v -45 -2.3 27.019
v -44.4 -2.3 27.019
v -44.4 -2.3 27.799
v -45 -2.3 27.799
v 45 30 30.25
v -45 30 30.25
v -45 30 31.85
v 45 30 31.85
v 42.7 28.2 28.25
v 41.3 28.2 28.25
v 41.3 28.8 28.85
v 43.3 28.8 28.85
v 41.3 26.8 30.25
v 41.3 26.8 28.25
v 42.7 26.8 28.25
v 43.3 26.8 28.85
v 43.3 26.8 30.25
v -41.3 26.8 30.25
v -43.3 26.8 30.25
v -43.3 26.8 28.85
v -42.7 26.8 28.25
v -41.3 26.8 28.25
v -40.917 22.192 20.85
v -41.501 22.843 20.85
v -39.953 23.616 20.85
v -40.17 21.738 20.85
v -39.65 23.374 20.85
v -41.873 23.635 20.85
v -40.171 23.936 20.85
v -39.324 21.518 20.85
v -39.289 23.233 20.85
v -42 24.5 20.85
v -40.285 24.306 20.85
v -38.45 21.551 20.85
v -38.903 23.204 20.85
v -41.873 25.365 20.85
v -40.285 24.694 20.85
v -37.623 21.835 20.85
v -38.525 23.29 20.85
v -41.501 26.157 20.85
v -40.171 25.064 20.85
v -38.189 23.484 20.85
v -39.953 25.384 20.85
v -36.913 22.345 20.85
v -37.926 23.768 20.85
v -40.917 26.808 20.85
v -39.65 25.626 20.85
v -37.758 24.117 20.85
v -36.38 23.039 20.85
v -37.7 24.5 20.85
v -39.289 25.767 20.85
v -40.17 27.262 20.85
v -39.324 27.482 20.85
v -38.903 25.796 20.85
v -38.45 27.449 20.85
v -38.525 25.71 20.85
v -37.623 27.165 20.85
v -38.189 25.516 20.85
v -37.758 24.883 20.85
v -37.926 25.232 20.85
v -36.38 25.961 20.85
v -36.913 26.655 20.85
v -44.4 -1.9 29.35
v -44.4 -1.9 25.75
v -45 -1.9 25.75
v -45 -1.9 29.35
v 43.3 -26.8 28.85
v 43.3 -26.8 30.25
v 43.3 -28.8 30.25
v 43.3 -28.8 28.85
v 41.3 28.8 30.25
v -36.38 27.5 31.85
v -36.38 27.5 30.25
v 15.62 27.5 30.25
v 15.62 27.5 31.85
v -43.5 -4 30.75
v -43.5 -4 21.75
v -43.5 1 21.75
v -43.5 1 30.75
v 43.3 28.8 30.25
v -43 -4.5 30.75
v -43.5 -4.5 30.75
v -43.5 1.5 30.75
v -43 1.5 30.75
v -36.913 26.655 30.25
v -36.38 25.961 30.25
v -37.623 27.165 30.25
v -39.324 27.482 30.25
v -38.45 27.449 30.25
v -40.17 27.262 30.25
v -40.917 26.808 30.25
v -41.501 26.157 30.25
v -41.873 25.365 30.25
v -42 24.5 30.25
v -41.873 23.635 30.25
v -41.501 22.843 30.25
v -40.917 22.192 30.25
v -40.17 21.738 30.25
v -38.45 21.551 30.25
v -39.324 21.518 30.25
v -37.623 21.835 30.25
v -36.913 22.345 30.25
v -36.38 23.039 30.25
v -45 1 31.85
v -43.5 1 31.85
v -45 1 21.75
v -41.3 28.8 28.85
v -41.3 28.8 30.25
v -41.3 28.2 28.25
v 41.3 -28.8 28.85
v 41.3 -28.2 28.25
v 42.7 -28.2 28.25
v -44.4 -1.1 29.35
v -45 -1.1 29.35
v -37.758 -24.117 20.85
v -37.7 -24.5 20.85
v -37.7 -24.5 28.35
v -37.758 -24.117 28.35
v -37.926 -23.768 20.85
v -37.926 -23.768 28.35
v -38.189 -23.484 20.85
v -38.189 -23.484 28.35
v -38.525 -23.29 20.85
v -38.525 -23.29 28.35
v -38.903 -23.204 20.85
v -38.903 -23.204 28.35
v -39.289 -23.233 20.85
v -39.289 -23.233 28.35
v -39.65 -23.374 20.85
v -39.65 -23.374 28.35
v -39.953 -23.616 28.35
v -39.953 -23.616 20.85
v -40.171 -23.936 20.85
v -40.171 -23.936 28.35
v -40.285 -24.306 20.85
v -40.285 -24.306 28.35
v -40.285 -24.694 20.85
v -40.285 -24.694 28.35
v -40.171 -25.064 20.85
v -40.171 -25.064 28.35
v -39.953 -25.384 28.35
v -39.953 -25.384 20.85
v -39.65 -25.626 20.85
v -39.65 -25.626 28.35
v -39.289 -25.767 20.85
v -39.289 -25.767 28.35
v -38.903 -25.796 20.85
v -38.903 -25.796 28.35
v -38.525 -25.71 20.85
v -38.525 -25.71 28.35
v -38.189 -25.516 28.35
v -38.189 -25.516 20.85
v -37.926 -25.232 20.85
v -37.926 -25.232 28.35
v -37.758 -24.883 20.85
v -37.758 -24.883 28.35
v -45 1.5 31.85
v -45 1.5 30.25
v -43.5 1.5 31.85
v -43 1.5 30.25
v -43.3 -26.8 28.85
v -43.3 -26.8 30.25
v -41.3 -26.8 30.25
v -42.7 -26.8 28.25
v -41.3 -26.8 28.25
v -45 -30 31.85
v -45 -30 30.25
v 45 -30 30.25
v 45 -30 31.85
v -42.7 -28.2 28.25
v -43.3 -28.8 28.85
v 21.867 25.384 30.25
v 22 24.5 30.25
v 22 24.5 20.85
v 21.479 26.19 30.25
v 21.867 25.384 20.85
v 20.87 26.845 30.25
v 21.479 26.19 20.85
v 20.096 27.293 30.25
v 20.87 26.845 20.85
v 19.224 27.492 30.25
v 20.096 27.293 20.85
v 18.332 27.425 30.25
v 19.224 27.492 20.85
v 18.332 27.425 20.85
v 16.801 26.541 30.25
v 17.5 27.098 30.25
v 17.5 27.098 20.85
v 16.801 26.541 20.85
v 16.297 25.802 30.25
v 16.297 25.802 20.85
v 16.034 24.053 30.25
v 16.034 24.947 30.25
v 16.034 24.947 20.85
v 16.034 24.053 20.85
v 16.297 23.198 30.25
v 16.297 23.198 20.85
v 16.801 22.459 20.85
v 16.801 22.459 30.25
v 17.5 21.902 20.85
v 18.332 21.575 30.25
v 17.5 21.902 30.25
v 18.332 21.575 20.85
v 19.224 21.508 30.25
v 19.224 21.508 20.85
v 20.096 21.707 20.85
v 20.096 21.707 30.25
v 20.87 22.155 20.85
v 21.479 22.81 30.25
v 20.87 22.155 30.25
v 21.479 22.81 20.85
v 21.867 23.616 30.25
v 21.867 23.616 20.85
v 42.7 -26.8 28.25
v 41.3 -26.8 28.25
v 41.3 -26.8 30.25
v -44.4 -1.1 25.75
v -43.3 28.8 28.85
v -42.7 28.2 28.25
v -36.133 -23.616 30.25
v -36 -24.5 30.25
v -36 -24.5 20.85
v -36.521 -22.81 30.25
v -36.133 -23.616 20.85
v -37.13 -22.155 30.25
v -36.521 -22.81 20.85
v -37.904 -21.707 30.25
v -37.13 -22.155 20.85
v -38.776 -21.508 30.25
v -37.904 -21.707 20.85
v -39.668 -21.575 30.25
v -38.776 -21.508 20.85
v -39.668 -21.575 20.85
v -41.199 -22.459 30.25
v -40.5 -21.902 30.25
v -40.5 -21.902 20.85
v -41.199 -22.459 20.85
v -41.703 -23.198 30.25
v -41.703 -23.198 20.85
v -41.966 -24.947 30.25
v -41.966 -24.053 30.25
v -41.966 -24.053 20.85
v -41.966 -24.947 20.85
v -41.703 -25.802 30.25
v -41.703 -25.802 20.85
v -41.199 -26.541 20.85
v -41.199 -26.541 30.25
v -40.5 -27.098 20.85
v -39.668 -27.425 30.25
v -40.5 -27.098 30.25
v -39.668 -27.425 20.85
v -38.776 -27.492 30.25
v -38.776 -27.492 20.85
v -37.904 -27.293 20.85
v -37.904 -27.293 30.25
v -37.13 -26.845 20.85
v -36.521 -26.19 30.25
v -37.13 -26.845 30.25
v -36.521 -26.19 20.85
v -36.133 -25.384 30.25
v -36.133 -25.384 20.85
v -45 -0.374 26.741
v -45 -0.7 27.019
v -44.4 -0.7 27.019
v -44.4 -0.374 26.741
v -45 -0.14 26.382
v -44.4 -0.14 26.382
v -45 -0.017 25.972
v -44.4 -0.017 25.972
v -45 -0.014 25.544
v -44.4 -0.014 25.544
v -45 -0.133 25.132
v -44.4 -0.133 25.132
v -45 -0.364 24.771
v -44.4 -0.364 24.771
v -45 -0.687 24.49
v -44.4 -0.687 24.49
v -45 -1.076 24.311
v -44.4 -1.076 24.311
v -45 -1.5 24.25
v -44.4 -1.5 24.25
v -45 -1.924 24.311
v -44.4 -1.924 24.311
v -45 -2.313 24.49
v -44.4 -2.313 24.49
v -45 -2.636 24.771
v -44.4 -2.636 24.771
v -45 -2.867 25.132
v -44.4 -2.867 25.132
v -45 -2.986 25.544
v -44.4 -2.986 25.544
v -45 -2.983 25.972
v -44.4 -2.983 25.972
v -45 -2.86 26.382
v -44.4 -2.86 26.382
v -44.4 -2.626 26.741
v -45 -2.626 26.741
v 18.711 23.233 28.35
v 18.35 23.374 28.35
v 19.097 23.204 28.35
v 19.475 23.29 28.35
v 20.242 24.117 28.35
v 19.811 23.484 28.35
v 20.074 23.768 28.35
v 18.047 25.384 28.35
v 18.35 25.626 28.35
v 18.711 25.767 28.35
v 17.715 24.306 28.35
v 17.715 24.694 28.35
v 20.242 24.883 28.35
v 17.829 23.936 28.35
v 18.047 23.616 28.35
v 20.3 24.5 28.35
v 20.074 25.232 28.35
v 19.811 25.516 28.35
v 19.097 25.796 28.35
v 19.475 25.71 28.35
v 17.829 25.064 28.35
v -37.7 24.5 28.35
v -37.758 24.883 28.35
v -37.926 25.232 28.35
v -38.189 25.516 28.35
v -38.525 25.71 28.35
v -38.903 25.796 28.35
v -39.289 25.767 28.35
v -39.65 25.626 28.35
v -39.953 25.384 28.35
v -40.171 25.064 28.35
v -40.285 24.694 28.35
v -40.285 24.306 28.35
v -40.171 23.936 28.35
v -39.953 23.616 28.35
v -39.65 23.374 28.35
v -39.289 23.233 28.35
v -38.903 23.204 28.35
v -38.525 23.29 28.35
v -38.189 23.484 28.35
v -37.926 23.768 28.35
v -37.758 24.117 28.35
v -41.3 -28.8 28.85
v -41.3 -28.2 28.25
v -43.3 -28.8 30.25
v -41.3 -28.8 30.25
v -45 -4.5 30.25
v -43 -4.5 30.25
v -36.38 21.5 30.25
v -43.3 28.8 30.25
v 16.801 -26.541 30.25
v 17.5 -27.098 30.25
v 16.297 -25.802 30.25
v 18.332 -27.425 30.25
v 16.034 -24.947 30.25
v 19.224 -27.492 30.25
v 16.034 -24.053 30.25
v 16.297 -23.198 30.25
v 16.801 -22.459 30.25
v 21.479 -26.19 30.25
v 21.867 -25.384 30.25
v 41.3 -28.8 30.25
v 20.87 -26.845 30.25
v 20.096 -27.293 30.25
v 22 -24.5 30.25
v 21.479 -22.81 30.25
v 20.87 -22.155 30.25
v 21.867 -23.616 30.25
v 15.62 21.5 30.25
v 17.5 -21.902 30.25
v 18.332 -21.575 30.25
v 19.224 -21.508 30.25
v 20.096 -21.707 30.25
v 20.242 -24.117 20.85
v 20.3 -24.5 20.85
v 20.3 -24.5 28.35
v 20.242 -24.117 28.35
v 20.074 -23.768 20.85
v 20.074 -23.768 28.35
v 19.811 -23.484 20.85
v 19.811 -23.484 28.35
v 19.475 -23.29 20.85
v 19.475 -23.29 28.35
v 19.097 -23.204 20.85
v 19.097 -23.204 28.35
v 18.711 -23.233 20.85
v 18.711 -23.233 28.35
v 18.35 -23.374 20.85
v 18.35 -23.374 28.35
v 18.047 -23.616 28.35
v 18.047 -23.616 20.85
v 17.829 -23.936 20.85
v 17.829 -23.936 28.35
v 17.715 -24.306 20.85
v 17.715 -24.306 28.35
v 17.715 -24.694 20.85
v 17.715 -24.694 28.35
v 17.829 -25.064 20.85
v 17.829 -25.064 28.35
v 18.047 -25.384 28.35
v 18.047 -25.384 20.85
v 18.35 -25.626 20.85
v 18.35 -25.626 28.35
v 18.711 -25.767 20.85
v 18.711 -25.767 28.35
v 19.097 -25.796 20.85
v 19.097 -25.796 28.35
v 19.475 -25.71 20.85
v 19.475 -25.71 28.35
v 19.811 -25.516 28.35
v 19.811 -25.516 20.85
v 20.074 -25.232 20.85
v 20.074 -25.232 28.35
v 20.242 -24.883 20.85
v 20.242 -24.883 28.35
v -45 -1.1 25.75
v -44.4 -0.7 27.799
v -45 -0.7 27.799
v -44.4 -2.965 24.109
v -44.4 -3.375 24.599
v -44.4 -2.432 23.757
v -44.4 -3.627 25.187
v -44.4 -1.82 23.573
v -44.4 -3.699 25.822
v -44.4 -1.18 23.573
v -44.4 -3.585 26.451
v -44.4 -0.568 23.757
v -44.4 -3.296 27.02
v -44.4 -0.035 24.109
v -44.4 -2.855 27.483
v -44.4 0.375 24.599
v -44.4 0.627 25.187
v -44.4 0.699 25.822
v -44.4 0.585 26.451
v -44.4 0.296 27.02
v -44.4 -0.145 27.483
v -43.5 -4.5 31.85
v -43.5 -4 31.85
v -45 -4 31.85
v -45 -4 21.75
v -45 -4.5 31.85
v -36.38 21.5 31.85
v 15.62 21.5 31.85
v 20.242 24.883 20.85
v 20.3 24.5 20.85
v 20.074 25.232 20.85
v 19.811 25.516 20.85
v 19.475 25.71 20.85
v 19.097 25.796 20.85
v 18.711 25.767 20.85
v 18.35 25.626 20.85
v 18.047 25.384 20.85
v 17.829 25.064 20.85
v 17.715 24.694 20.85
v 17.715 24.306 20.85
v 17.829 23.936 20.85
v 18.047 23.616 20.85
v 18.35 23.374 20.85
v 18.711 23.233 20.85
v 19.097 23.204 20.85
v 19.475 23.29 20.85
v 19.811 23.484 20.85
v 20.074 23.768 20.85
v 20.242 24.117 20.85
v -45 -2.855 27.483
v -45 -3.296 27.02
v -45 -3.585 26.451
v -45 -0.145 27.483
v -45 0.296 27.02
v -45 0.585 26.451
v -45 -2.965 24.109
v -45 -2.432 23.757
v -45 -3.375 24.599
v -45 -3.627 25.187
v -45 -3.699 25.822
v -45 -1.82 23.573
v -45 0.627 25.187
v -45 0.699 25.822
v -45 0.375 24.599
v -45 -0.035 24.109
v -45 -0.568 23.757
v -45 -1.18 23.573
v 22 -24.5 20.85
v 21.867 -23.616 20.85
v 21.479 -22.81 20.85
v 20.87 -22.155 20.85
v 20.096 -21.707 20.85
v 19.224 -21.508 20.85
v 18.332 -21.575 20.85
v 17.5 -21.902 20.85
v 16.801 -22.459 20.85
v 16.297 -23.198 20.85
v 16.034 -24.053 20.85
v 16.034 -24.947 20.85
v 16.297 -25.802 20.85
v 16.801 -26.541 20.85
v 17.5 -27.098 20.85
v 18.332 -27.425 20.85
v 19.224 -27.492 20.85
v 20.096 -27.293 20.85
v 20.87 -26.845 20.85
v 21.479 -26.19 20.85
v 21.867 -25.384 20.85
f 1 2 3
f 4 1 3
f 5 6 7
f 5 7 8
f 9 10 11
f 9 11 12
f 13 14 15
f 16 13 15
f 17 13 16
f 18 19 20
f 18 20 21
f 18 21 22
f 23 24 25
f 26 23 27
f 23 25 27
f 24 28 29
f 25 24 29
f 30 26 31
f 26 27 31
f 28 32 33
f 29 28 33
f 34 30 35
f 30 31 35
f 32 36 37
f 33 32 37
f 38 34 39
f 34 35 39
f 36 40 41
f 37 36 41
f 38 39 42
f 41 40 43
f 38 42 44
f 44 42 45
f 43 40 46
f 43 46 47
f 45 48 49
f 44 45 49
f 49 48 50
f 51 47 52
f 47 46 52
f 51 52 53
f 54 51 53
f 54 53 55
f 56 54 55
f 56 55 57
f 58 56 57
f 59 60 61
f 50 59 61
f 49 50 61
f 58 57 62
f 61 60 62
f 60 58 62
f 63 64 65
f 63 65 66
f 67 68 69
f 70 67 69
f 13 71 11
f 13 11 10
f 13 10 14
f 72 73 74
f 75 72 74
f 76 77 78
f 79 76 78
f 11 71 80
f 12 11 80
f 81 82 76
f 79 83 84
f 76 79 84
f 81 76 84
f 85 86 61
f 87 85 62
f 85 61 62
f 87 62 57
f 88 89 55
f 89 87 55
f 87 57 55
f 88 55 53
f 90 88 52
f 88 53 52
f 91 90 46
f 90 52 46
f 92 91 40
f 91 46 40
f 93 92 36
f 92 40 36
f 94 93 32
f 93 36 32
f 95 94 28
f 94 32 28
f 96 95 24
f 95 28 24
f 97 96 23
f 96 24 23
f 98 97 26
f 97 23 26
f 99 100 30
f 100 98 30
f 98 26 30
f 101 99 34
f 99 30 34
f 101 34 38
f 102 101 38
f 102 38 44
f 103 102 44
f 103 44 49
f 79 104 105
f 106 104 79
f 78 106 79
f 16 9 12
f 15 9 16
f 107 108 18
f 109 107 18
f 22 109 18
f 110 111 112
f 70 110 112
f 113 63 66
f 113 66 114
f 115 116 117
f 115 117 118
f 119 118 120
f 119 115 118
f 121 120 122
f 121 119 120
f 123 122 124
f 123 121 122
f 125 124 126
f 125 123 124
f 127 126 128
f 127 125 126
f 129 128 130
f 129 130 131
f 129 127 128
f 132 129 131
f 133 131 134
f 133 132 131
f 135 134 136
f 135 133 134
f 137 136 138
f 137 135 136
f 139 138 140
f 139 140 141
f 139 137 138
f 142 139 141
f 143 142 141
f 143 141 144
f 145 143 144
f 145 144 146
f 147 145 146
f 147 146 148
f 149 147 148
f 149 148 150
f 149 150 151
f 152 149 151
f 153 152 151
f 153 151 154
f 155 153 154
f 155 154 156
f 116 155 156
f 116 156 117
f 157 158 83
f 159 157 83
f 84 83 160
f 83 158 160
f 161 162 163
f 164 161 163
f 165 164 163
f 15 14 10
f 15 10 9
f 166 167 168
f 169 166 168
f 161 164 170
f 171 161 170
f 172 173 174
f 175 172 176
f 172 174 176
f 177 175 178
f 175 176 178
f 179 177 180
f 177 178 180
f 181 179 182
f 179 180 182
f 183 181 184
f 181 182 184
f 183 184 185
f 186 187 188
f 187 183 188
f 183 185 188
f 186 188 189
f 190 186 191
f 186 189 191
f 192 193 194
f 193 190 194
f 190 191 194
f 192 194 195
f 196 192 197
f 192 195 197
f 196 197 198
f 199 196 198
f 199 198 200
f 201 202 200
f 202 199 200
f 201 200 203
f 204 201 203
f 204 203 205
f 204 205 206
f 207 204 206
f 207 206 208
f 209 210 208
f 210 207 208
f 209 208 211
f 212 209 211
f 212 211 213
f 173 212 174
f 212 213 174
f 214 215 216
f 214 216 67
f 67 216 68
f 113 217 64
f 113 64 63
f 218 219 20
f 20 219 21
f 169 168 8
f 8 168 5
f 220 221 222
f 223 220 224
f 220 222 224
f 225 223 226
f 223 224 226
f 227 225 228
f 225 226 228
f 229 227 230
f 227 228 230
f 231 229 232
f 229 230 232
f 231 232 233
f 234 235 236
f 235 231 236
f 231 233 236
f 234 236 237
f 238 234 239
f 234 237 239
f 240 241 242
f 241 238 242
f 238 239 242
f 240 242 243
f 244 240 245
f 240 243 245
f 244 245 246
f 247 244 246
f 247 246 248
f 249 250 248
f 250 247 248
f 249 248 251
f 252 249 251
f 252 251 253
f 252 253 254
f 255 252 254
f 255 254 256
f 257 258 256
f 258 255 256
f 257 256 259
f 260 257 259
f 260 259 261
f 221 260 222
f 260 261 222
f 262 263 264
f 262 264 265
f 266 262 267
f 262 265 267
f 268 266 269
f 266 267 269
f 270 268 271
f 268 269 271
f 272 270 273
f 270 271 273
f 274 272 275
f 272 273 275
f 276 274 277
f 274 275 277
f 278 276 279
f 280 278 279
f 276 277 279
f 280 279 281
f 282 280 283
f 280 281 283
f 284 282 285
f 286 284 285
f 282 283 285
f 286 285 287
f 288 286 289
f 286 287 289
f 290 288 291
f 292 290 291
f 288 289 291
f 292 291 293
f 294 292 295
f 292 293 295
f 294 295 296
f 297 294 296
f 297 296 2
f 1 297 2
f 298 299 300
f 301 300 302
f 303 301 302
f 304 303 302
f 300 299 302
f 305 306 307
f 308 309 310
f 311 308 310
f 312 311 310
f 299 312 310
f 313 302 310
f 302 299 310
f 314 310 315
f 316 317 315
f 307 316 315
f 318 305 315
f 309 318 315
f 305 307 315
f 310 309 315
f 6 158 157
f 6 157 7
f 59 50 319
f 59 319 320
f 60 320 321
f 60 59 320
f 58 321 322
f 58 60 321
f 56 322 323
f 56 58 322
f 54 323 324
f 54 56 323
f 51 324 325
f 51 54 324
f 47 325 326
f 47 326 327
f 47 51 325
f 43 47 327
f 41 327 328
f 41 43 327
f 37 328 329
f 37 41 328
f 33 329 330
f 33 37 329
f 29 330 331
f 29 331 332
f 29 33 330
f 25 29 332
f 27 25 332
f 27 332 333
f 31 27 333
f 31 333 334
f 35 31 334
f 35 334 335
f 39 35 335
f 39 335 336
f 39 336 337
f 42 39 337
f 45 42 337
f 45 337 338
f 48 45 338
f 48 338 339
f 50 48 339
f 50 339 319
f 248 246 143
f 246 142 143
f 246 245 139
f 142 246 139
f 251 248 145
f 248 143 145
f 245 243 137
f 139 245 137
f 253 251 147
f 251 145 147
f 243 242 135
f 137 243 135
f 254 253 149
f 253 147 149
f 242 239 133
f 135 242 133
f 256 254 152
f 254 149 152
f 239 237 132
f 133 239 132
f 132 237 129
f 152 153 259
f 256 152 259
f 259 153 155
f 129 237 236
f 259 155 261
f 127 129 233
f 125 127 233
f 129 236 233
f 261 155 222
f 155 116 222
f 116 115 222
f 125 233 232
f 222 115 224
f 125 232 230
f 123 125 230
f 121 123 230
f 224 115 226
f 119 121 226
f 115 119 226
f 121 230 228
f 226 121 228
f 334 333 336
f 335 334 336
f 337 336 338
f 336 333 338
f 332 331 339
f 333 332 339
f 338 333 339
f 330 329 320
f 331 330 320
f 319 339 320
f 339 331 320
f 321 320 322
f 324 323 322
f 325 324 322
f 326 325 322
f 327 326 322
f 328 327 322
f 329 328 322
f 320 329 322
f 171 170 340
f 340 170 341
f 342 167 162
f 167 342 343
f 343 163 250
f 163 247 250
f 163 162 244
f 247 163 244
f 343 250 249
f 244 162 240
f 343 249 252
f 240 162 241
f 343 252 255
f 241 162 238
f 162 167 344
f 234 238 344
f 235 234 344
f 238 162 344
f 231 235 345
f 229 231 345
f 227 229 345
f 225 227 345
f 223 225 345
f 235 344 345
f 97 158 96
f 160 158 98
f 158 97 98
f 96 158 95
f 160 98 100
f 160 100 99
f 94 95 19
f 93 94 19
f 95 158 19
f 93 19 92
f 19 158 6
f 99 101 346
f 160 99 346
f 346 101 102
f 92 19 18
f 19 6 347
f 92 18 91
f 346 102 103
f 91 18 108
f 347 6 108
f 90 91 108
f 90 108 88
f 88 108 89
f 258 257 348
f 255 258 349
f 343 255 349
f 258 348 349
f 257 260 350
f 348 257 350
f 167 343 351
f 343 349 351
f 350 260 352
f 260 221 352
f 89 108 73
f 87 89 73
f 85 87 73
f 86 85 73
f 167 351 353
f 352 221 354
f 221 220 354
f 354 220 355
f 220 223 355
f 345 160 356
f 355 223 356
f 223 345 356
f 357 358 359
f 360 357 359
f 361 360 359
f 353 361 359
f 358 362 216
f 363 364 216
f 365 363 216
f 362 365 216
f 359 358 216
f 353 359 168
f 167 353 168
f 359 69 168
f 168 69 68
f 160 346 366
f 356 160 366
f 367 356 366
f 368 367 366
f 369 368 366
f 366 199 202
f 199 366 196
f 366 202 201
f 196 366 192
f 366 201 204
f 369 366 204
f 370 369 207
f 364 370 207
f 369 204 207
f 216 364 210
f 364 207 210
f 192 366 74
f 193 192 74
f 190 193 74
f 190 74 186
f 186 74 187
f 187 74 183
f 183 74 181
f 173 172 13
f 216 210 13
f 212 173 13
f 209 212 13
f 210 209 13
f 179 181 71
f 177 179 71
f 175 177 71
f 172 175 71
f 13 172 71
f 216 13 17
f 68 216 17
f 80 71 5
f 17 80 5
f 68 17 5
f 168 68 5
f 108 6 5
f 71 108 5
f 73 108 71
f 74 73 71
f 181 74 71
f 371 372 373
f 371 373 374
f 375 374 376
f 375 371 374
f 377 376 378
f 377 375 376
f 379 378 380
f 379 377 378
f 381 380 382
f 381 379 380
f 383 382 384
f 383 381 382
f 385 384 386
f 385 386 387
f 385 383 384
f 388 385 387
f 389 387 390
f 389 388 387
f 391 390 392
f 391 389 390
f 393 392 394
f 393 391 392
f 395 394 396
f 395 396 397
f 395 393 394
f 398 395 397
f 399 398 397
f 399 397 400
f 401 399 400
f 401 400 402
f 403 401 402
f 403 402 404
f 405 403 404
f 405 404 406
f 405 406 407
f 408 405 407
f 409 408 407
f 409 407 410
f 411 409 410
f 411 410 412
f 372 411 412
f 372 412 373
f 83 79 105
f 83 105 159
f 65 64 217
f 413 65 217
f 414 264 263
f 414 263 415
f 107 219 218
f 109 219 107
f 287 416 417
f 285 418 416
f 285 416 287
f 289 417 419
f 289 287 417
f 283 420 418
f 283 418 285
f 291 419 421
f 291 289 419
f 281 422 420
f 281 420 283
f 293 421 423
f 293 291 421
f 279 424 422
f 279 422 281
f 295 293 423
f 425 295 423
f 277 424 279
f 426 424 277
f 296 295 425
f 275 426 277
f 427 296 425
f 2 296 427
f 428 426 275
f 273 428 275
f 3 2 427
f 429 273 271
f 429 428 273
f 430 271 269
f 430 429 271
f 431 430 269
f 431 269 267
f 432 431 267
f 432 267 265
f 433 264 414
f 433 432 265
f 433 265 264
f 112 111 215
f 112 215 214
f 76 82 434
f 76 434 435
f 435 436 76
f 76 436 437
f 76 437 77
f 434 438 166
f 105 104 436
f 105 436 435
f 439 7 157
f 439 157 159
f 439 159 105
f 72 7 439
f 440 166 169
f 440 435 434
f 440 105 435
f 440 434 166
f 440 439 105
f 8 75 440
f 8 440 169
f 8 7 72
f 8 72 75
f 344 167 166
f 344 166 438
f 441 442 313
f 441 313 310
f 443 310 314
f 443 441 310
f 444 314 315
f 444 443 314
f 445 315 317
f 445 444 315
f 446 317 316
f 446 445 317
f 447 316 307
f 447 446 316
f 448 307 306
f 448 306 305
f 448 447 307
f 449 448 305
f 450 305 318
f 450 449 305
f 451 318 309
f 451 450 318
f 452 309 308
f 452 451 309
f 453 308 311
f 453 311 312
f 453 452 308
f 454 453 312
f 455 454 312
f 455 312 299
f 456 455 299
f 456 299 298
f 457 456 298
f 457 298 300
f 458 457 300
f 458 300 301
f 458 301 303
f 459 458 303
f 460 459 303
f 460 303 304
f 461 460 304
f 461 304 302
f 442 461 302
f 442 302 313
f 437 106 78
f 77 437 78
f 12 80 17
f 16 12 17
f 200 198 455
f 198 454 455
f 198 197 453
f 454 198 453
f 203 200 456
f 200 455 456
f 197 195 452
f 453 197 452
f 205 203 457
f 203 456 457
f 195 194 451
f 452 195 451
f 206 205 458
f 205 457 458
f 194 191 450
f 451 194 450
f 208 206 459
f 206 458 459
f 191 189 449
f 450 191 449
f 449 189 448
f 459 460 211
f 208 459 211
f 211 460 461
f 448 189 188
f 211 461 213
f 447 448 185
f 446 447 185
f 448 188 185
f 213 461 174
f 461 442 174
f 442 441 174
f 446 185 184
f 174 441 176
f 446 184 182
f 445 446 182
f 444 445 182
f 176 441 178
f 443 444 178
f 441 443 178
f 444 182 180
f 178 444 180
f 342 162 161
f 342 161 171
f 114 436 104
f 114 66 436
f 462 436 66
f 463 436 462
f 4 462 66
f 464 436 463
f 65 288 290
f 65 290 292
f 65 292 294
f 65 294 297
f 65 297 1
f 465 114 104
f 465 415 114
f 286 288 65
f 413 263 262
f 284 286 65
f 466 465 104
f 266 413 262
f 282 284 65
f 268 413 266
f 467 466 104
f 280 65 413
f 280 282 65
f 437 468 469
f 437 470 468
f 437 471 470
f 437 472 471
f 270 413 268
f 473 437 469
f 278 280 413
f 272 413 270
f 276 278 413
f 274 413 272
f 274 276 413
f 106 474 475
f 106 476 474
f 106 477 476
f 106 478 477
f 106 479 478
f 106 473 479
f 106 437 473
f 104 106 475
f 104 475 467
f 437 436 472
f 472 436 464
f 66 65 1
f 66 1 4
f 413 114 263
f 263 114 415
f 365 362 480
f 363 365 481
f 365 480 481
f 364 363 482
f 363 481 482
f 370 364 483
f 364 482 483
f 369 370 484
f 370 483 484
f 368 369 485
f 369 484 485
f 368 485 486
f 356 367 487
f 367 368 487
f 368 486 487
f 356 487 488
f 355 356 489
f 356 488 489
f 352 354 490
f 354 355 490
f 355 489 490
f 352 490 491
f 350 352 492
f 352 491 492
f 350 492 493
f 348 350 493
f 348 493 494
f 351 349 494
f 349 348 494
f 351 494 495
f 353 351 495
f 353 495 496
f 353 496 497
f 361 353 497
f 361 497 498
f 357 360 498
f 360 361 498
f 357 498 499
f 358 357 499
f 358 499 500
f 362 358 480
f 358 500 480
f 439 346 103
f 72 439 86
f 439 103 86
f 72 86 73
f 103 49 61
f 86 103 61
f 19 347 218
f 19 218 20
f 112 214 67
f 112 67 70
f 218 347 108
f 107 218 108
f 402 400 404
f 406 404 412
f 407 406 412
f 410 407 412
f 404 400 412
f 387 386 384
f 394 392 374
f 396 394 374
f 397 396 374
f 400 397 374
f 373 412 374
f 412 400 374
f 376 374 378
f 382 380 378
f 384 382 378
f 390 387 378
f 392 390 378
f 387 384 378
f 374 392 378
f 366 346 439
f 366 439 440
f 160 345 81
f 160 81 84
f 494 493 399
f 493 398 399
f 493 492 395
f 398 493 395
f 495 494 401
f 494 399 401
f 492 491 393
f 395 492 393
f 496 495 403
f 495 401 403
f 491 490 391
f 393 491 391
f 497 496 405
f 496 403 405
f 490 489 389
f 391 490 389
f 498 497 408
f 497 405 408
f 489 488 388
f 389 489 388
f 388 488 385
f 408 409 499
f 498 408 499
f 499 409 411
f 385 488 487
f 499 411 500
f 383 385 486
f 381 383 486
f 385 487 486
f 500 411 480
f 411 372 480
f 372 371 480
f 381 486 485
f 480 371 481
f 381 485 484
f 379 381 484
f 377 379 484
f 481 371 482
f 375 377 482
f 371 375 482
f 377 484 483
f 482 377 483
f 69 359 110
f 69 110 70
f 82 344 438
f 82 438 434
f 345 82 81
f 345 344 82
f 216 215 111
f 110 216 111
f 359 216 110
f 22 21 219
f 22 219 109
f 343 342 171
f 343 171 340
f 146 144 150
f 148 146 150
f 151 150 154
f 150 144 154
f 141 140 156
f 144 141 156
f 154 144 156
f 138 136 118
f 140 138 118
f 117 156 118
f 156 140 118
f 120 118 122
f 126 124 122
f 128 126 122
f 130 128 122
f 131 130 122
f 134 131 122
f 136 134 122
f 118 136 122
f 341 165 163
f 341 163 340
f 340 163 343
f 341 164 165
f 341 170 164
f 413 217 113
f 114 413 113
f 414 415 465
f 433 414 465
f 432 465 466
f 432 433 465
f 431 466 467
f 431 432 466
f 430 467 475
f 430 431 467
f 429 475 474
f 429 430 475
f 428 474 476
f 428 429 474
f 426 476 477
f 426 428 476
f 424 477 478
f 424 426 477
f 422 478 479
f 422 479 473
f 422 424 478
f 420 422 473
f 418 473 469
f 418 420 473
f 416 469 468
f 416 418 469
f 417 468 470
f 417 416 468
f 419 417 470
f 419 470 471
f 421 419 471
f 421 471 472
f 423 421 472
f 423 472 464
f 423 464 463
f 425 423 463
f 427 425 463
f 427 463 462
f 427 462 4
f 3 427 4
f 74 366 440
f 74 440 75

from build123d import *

# Parameters (mm, degrees)
BOX063_W                   = 4
BOX063_H                   = 1.6
BOX063_DEPTH               = 0.6
CYLINDER043_R              = 1.5
CYLINDER043_DEPTH          = 0.6
CYLINDER042_R              = 2.2
CYLINDER042_DEPTH          = 0.6
BOX064_W                   = 3.6
BOX064_H                   = 0.8
BOX064_DEPTH               = 0.6
FUSION040_PLACEMENT_ANGLE  = 90
BOX061_W                   = 1.5
BOX061_H                   = 0.5
BOX061_DEPTH               = 3
BOX066_W                   = 1.5
BOX066_H                   = 0.5
BOX066_DEPTH               = 3
BOX060_W                   = 0.5
BOX060_H                   = 6
BOX060_DEPTH               = 1
BOX068_W                   = 52
BOX068_H                   = 6
BOX068_DEPTH               = 12
CYLINDER045_R              = 1.3
CYLINDER045_DEPTH          = 8
CYLINDER037_R              = 1.3
CYLINDER037_DEPTH          = 8
CYLINDER044_R              = 1.3
CYLINDER044_DEPTH          = 8
CYLINDER040_R              = 1.3
CYLINDER040_DEPTH          = 8
CYLINDER041_R              = 3
CYLINDER041_DEPTH          = 9.5
CYLINDER039_R              = 3
CYLINDER039_DEPTH          = 9.5
CYLINDER046_R              = 3
CYLINDER046_DEPTH          = 9.5
CYLINDER038_R              = 3
CYLINDER038_DEPTH          = 9.5
BOX069_W                   = 90
BOX069_H                   = 60
BOX069_DEPTH               = 1.6
BOX059_W                   = 1.5
BOX059_H                   = 5
BOX059_DEPTH               = 8.5
BOX070_W                   = 2
BOX070_H                   = 2
BOX070_DEPTH               = 2
BOX062_W                   = 2
BOX062_H                   = 2
BOX062_DEPTH               = 2
BOX065_W                   = 2
BOX065_H                   = 2
BOX065_DEPTH               = 2
BOX067_W                   = 2
BOX067_H                   = 2
BOX067_DEPTH               = 2
CHAMFER007_SIZE            = 0.6
CHAMFER007_PLACEMENT_ANGLE = 180


with BuildPart() as w_rfel041:
    # Box063 → Box063 (new body)
    with BuildSketch(Plane(origin=(0, -0.8, 0), x_dir=(1, 0, 0), z_dir=(0, 0, 1))):
        with Locations((2, 0.8)):
            Rectangle(BOX063_W, BOX063_H)
    extrude(amount=BOX063_DEPTH)


with BuildPart() as zylinder042:
    # Cylinder043 → Cylinder043 (new body)
    with BuildSketch(Plane.XY):
        Circle(CYLINDER043_R)
    extrude(amount=CYLINDER043_DEPTH)


with BuildPart() as off:
    # Cylinder042 → Cylinder042 (new body)
    with BuildSketch(Plane.XY):
        Circle(CYLINDER042_R)
    extrude(amount=CYLINDER042_DEPTH)

    # Cut026: cut Zylinder042
    add(zylinder042.part, mode=Mode.SUBTRACT)

    # Cut023: cut Würfel041
    add(w_rfel041.part, mode=Mode.SUBTRACT)


with BuildPart() as onoff:
    # Box064 → Box064 (new body)
    with BuildSketch(Plane(origin=(0, -0.4, 0), x_dir=(1, 0, 0), z_dir=(0, 0, 1))):
        with Locations((1.8, 0.4)):
            Rectangle(BOX064_W, BOX064_H)
    extrude(amount=BOX064_DEPTH)

    # Fusion040: union Off
    add(off.part)


with BuildPart() as onoff_1:
    # Fusion040 placement: moved
    add(onoff.part.moved(Location((-44.4, -1.5, 11))).rotate(Axis((-44.4, -1.5, 11), (0, -1, 0)), FUSION040_PLACEMENT_ANGLE))


with BuildPart() as knopf002:
    # Box061 → Box061 (new body)
    with BuildSketch(Plane(origin=(-45, 1, 15), x_dir=(1, 0, 0), z_dir=(0, 0, 1))):
        with Locations((0.75, 0.25)):
            Rectangle(BOX061_W, BOX061_H)
    extrude(amount=BOX061_DEPTH)


with BuildPart() as knopf003:
    # Box066 → Box066 (new body)
    with BuildSketch(Plane(origin=(-45, -4.5, 15), x_dir=(1, 0, 0), z_dir=(0, 0, 1))):
        with Locations((0.75, 0.25)):
            Rectangle(BOX066_W, BOX066_H)
    extrude(amount=BOX066_DEPTH)


with BuildPart() as knopfaussparungen:
    # Box060 → Box060 (new body)
    with BuildSketch(Plane(origin=(-43.5, -4.5, 15), x_dir=(1, 0, 0), z_dir=(0, 0, 1))):
        with Locations((0.25, 3)):
            Rectangle(BOX060_W, BOX060_H)
    extrude(amount=BOX060_DEPTH)

    # Fusion038: union Knopf002, Knopf003
    add(knopf002.part)
    add(knopf003.part)


with BuildPart() as stack_ffnung:
    # Box068 → Box068 (new body)
    with BuildSketch(Plane(origin=(-36.38, 21.5, 6), x_dir=(1, 0, 0), z_dir=(0, 0, 1))):
        with Locations((26, 3)):
            Rectangle(BOX068_W, BOX068_H)
    extrude(amount=BOX068_DEPTH)


with BuildPart() as zylinder044:
    # Cylinder045 → Cylinder045 (new body)
    with BuildSketch(Plane(origin=(-39, 24.5, 0), x_dir=(1, 0, 0), z_dir=(0, 0, 1))):
        Circle(CYLINDER045_R)
    extrude(amount=CYLINDER045_DEPTH)


with BuildPart() as fusion064:
    # Cylinder037 → Cylinder037 (new body)
    with BuildSketch(Plane(origin=(-39, -24.5, 0), x_dir=(1, 0, 0), z_dir=(0, 0, 1))):
        Circle(CYLINDER037_R)
    extrude(amount=CYLINDER037_DEPTH)

    # Fusion064: union Zylinder044
    add(zylinder044.part)


with BuildPart() as fusion064_1:
    # Fusion064 placement: moved
    add(fusion064.part.moved(Location((58, 0, 0))))


with BuildPart() as zylinder043:
    # Cylinder044 → Cylinder044 (new body)
    with BuildSketch(Plane(origin=(-39, 24.5, 0), x_dir=(1, 0, 0), z_dir=(0, 0, 1))):
        Circle(CYLINDER044_R)
    extrude(amount=CYLINDER044_DEPTH)


with BuildPart() as bohrungen002:
    # Cylinder040 → Cylinder040 (new body)
    with BuildSketch(Plane(origin=(-39, -24.5, 0), x_dir=(1, 0, 0), z_dir=(0, 0, 1))):
        Circle(CYLINDER040_R)
    extrude(amount=CYLINDER040_DEPTH)

    # Fusion070: union Zylinder043
    add(zylinder043.part)

    # Fusion069: union Fusion064
    add(fusion064_1.part)


with BuildPart() as bohrungen002_1:
    # Fusion069 placement: moved
    add(bohrungen002.part.moved(Location((0, 0, 5.6))))


with BuildPart() as zylinder040:
    # Cylinder041 → Cylinder041 (new body)
    with BuildSketch(Plane(origin=(-39, 24.5, 2), x_dir=(1, 0, 0), z_dir=(0, 0, 1))):
        Circle(CYLINDER041_R)
    extrude(amount=CYLINDER041_DEPTH)


with BuildPart() as fusion068:
    # Cylinder039 → Cylinder039 (new body)
    with BuildSketch(Plane(origin=(-39, -24.5, 2), x_dir=(1, 0, 0), z_dir=(0, 0, 1))):
        Circle(CYLINDER039_R)
    extrude(amount=CYLINDER039_DEPTH)

    # Fusion068: union Zylinder040
    add(zylinder040.part)


with BuildPart() as fusion068_1:
    # Fusion068 placement: moved
    add(fusion068.part.moved(Location((58, 0, 0))))


with BuildPart() as zylinder045:
    # Cylinder046 → Cylinder046 (new body)
    with BuildSketch(Plane(origin=(-39, 24.5, 2), x_dir=(1, 0, 0), z_dir=(0, 0, 1))):
        Circle(CYLINDER046_R)
    extrude(amount=CYLINDER046_DEPTH)


with BuildPart() as deckelst_tzen:
    # Cylinder038 → Cylinder038 (new body)
    with BuildSketch(Plane(origin=(-39, -24.5, 2), x_dir=(1, 0, 0), z_dir=(0, 0, 1))):
        Circle(CYLINDER038_R)
    extrude(amount=CYLINDER038_DEPTH)

    # Fusion062: union Zylinder045
    add(zylinder045.part)

    # Fusion063: union Fusion068
    add(fusion068_1.part)


with BuildPart() as deckelst_tzen_1:
    # Fusion063 placement: moved
    add(deckelst_tzen.part.moved(Location((0, 0, 4.1))))

    # Cut022: cut Bohrungen002
    add(bohrungen002_1.part, mode=Mode.SUBTRACT)


with BuildPart() as deckel_mit_knopfschlitzen:
    # Box069 → Box069 (new body)
    with BuildSketch(Plane(origin=(-45, -30, 15.5), x_dir=(1, 0, 0), z_dir=(0, 0, 1))):
        with Locations((45, 30)):
            Rectangle(BOX069_W, BOX069_H)
    extrude(amount=BOX069_DEPTH)

    # Fusion037: union Deckelstützen
    add(deckelst_tzen_1.part)

    # Cut021: cut Stack-Öffnung
    add(stack_ffnung.part, mode=Mode.SUBTRACT)

    # Cut025: cut Knopfaussparungen
    add(knopfaussparungen.part, mode=Mode.SUBTRACT)


with BuildPart() as deckel_mit_io_button:
    # Box059 → Box059 (new body)
    with BuildSketch(Plane(origin=(-45, -4, 7), x_dir=(1, 0, 0), z_dir=(0, 0, 1))):
        with Locations((0.75, 2.5)):
            Rectangle(BOX059_W, BOX059_H)
    extrude(amount=BOX059_DEPTH)

    # Fusion039: union Deckel mit Knopfschlitzen
    add(deckel_mit_knopfschlitzen.part)

    # Cut024: cut OnOff
    add(onoff_1.part, mode=Mode.SUBTRACT)


with BuildPart() as w_rfel044:
    # Box070 → Box070 (new body)
    with BuildSketch(Plane(origin=(41.3, -28.8, 14), x_dir=(1, 0, 0), z_dir=(0, 0, 1))):
        with Locations((1, 1)):
            Rectangle(BOX070_W, BOX070_H)
    extrude(amount=BOX070_DEPTH)


with BuildPart() as fusion066:
    # Box062 → Box062 (new body)
    with BuildSketch(Plane(origin=(41.3, 26.8, 14), x_dir=(1, 0, 0), z_dir=(0, 0, 1))):
        with Locations((1, 1)):
            Rectangle(BOX062_W, BOX062_H)
    extrude(amount=BOX062_DEPTH)

    # Fusion066: union Würfel044
    add(w_rfel044.part)


with BuildPart() as fusion066_1:
    # Fusion066 placement: moved
    add(fusion066.part.moved(Location((-84.6, 0, 0))))


with BuildPart() as w_rfel042:
    # Box065 → Box065 (new body)
    with BuildSketch(Plane(origin=(41.3, -28.8, 14), x_dir=(1, 0, 0), z_dir=(0, 0, 1))):
        with Locations((1, 1)):
            Rectangle(BOX065_W, BOX065_H)
    extrude(amount=BOX065_DEPTH)


with BuildPart() as expander_deckel_fertig:
    # Box067 → Box067 (new body)
    with BuildSketch(Plane(origin=(41.3, 26.8, 14), x_dir=(1, 0, 0), z_dir=(0, 0, 1))):
        with Locations((1, 1)):
            Rectangle(BOX067_W, BOX067_H)
    extrude(amount=BOX067_DEPTH)

    # Fusion061: union Würfel042
    add(w_rfel042.part)

    # Fusion065: union Fusion066
    add(fusion066_1.part)

    # Chamfer007
    chamfer007_edges = [expander_deckel_fertig.edges().sort_by_distance(p)[0] for p in [
        (43.3, 27.8, 16),
        (42.3, 28.8, 16),
        (43.3, -27.8, 16),
        (42.3, -28.8, 16),
        (-43.3, 27.8, 16),
        (-42.3, 28.8, 16),
        (-43.3, -27.8, 16),
        (-42.3, -28.8, 16),
    ]]
    chamfer(chamfer007_edges, length=CHAMFER007_SIZE)


with BuildPart() as expander_deckel_fertig_1:
    # Chamfer007 placement: moved
    add(expander_deckel_fertig.part.moved(Location((0, 0, 29.5))).rotate(Axis((0, 0, 29.5), (1, 0, 0)), CHAMFER007_PLACEMENT_ANGLE))

    # Fusion067: union Deckel mit IO-Button
    add(deckel_mit_io_button.part)


with BuildPart() as expander_deckel_fertig_2:
    # Fusion067 placement: moved
    add(expander_deckel_fertig_1.part.moved(Location((0, 0, 14.75))))


solid = expander_deckel_fertig_2.part
